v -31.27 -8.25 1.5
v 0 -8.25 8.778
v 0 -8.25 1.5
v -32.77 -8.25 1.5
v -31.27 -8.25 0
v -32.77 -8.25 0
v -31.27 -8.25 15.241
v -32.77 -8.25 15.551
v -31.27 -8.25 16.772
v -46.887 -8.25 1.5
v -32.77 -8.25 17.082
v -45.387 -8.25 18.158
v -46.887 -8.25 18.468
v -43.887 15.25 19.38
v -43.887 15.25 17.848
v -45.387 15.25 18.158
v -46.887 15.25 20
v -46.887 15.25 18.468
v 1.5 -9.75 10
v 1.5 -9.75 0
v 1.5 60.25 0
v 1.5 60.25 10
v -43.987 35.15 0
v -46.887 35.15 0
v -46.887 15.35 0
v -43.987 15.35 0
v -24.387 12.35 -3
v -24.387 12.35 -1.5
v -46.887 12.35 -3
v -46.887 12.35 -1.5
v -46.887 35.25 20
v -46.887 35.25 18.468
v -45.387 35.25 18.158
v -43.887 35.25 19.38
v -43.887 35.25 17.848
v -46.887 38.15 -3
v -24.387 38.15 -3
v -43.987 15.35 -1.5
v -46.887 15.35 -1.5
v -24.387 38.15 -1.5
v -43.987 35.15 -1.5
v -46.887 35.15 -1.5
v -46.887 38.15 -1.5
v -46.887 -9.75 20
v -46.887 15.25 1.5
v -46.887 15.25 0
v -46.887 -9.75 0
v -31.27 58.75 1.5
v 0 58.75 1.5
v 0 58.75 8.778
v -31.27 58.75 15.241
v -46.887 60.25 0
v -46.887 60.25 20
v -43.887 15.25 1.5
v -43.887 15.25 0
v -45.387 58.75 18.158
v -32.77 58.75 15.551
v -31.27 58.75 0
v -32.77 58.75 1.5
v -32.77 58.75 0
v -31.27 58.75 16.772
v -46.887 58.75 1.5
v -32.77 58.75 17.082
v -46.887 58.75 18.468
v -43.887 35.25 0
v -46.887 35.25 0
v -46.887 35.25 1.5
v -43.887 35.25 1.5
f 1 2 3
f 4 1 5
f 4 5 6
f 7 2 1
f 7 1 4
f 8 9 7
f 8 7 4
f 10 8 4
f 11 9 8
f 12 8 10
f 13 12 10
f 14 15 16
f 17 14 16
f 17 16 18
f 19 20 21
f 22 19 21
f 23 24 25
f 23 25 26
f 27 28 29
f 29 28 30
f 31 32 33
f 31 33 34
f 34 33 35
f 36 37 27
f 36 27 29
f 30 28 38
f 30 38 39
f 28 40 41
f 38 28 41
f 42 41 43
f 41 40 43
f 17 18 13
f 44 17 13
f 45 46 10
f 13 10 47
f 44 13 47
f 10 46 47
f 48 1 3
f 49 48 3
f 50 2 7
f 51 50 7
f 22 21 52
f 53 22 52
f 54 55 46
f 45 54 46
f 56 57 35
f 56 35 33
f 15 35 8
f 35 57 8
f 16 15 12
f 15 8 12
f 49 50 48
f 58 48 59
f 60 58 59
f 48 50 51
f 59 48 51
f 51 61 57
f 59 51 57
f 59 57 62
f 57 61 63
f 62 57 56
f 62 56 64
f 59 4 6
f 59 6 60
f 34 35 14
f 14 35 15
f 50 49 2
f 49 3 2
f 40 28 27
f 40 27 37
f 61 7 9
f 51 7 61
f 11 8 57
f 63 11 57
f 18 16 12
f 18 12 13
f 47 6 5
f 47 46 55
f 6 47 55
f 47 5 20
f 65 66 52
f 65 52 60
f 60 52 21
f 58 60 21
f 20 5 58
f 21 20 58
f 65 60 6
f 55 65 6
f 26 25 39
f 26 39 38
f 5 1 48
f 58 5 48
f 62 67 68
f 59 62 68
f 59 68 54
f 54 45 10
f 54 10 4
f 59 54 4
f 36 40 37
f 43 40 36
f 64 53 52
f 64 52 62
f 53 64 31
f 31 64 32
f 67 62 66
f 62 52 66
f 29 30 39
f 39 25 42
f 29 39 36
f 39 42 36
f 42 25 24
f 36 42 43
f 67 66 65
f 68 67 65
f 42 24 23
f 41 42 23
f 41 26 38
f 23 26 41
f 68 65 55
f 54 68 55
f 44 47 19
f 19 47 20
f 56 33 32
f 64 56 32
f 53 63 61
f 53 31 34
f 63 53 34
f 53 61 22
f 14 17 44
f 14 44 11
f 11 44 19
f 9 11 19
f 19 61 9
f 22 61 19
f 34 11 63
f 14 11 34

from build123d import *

# Parameters (mm, degrees)
SKETCH1_W                      = 2.9
SKETCH1_H                      = 19.8
BOSS_EXTRUDE1_DEPTH            = 1.5
SKETCH2_W                      = 22.5
SKETCH2_H                      = 25.8
BOSS_EXTRUDE3_DEPTH            = 1.5
BOSS_EXTRUDE4_DEPTH            = 20
CUT_EXTRUDE1_DEPTH             = 70
CUT_EXTRUDE2_START             = -35
CUT_EXTRUDE2_DEPTH             = 33.5
CUT_EXTRUDE3_REACH             = 80.554
SKETCH6_W                      = 1.5
SKETCH6_H                      = 67
CUT_EXTRUDE3_DIRECTION_2_DEPTH = 1.5


with BuildPart() as part:
    # Sketch1 → Boss-Extrude1 (new body)
    with BuildSketch(Plane.XY):
        with Locations((-45.437495374, 25.25)):
            Rectangle(SKETCH1_W, SKETCH1_H)
    extrude(amount=-BOSS_EXTRUDE1_DEPTH)

    # Sketch2 → Boss-Extrude3 (add)
    with BuildSketch(Plane(origin=(0, 0, -1.5), x_dir=(-1, 0, 0), z_dir=(0, 0, -1))):
        with Locations((35.637495374, 25.25)):
            Rectangle(SKETCH2_W, SKETCH2_H)
    extrude(amount=BOSS_EXTRUDE3_DEPTH)


with BuildPart() as body_2:
    # Sketch3 → Boss-Extrude4 (new body)
    with BuildSketch(Plane.XY):
        Polygon((-46.887495374, 35.25), (-43.887495374, 35.25), (-43.887495374, 15.25), (-46.887495374, 15.25), (-46.887495374, -9.75), (1.5, -9.75), (1.5, 60.25), (-46.887495374, 60.25), align=None)
    extrude(amount=BOSS_EXTRUDE4_DEPTH)

    # Sketch4 → Cut-Extrude1 (cut)
    with BuildSketch(Plane.XZ.offset(9.75)):
        Polygon((1.5, 20), (-46.887495374, 20), (1.5, 10), align=None)
    extrude(amount=-CUT_EXTRUDE1_DEPTH, mode=Mode.SUBTRACT)

    # Sketch5 → Cut-Extrude2 (cut)
    with BuildSketch(Plane.XZ.offset(9.75).offset(CUT_EXTRUDE2_START)):
        Polygon((-45.387495374, 18.158304667), (-45.387495374, 1.5), (0, 1.5), (0, 8.778299559), align=None)
        Polygon((-46.887495374, 1.5), (-45.387495374, 1.5), (-45.387495374, 18.158304667), (-46.887495374, 18.468302113), align=None)
    cut_extrude2 = extrude(amount=CUT_EXTRUDE2_DEPTH, mode=Mode.SUBTRACT)

    # Mirror1: Cut-Extrude2 across plane
    add(cut_extrude2.mirror(Plane.ZX.offset(25.25)), mode=Mode.SUBTRACT)

    # Cut-Extrude3: up to this plane
    cut_extrude3_end = Plane(origin=(2.043439135, 60.251, 9.887690171), z_dir=(-0.20238811385577932, 0, -0.9793053922908319))
    # Sketch6 → Cut-Extrude3 (cut, up to the surface)
    with BuildSketch(Plane(origin=(0, 0, 1.5), x_dir=(-1, 0, 0), z_dir=(0, 0, -1)), mode=Mode.PRIVATE) as cut_extrude3_sk1:
        with Locations((32.02, 25.25)):
            Rectangle(SKETCH6_W, SKETCH6_H)
    cut_extrude3_tool1 = split(extrude(cut_extrude3_sk1.sketch, amount=-CUT_EXTRUDE3_REACH, mode=Mode.PRIVATE), bisect_by=cut_extrude3_end, keep=Keep.BOTH, mode=Mode.PRIVATE)
    add(cut_extrude3_tool1.solids().sort_by_distance((-32.02, 25.25, 1.5))[0], mode=Mode.SUBTRACT)

    # Sketch6 → Cut-Extrude3 direction 2 (cut)
    with BuildSketch(Plane(origin=(0, 0, 1.5), x_dir=(-1, 0, 0), z_dir=(0, 0, -1))):
        with Locations((32.02, 25.25)):
            Rectangle(SKETCH6_W, SKETCH6_H)
    extrude(amount=CUT_EXTRUDE3_DIRECTION_2_DEPTH, mode=Mode.SUBTRACT)


solid = Compound([part.part, body_2.part])
